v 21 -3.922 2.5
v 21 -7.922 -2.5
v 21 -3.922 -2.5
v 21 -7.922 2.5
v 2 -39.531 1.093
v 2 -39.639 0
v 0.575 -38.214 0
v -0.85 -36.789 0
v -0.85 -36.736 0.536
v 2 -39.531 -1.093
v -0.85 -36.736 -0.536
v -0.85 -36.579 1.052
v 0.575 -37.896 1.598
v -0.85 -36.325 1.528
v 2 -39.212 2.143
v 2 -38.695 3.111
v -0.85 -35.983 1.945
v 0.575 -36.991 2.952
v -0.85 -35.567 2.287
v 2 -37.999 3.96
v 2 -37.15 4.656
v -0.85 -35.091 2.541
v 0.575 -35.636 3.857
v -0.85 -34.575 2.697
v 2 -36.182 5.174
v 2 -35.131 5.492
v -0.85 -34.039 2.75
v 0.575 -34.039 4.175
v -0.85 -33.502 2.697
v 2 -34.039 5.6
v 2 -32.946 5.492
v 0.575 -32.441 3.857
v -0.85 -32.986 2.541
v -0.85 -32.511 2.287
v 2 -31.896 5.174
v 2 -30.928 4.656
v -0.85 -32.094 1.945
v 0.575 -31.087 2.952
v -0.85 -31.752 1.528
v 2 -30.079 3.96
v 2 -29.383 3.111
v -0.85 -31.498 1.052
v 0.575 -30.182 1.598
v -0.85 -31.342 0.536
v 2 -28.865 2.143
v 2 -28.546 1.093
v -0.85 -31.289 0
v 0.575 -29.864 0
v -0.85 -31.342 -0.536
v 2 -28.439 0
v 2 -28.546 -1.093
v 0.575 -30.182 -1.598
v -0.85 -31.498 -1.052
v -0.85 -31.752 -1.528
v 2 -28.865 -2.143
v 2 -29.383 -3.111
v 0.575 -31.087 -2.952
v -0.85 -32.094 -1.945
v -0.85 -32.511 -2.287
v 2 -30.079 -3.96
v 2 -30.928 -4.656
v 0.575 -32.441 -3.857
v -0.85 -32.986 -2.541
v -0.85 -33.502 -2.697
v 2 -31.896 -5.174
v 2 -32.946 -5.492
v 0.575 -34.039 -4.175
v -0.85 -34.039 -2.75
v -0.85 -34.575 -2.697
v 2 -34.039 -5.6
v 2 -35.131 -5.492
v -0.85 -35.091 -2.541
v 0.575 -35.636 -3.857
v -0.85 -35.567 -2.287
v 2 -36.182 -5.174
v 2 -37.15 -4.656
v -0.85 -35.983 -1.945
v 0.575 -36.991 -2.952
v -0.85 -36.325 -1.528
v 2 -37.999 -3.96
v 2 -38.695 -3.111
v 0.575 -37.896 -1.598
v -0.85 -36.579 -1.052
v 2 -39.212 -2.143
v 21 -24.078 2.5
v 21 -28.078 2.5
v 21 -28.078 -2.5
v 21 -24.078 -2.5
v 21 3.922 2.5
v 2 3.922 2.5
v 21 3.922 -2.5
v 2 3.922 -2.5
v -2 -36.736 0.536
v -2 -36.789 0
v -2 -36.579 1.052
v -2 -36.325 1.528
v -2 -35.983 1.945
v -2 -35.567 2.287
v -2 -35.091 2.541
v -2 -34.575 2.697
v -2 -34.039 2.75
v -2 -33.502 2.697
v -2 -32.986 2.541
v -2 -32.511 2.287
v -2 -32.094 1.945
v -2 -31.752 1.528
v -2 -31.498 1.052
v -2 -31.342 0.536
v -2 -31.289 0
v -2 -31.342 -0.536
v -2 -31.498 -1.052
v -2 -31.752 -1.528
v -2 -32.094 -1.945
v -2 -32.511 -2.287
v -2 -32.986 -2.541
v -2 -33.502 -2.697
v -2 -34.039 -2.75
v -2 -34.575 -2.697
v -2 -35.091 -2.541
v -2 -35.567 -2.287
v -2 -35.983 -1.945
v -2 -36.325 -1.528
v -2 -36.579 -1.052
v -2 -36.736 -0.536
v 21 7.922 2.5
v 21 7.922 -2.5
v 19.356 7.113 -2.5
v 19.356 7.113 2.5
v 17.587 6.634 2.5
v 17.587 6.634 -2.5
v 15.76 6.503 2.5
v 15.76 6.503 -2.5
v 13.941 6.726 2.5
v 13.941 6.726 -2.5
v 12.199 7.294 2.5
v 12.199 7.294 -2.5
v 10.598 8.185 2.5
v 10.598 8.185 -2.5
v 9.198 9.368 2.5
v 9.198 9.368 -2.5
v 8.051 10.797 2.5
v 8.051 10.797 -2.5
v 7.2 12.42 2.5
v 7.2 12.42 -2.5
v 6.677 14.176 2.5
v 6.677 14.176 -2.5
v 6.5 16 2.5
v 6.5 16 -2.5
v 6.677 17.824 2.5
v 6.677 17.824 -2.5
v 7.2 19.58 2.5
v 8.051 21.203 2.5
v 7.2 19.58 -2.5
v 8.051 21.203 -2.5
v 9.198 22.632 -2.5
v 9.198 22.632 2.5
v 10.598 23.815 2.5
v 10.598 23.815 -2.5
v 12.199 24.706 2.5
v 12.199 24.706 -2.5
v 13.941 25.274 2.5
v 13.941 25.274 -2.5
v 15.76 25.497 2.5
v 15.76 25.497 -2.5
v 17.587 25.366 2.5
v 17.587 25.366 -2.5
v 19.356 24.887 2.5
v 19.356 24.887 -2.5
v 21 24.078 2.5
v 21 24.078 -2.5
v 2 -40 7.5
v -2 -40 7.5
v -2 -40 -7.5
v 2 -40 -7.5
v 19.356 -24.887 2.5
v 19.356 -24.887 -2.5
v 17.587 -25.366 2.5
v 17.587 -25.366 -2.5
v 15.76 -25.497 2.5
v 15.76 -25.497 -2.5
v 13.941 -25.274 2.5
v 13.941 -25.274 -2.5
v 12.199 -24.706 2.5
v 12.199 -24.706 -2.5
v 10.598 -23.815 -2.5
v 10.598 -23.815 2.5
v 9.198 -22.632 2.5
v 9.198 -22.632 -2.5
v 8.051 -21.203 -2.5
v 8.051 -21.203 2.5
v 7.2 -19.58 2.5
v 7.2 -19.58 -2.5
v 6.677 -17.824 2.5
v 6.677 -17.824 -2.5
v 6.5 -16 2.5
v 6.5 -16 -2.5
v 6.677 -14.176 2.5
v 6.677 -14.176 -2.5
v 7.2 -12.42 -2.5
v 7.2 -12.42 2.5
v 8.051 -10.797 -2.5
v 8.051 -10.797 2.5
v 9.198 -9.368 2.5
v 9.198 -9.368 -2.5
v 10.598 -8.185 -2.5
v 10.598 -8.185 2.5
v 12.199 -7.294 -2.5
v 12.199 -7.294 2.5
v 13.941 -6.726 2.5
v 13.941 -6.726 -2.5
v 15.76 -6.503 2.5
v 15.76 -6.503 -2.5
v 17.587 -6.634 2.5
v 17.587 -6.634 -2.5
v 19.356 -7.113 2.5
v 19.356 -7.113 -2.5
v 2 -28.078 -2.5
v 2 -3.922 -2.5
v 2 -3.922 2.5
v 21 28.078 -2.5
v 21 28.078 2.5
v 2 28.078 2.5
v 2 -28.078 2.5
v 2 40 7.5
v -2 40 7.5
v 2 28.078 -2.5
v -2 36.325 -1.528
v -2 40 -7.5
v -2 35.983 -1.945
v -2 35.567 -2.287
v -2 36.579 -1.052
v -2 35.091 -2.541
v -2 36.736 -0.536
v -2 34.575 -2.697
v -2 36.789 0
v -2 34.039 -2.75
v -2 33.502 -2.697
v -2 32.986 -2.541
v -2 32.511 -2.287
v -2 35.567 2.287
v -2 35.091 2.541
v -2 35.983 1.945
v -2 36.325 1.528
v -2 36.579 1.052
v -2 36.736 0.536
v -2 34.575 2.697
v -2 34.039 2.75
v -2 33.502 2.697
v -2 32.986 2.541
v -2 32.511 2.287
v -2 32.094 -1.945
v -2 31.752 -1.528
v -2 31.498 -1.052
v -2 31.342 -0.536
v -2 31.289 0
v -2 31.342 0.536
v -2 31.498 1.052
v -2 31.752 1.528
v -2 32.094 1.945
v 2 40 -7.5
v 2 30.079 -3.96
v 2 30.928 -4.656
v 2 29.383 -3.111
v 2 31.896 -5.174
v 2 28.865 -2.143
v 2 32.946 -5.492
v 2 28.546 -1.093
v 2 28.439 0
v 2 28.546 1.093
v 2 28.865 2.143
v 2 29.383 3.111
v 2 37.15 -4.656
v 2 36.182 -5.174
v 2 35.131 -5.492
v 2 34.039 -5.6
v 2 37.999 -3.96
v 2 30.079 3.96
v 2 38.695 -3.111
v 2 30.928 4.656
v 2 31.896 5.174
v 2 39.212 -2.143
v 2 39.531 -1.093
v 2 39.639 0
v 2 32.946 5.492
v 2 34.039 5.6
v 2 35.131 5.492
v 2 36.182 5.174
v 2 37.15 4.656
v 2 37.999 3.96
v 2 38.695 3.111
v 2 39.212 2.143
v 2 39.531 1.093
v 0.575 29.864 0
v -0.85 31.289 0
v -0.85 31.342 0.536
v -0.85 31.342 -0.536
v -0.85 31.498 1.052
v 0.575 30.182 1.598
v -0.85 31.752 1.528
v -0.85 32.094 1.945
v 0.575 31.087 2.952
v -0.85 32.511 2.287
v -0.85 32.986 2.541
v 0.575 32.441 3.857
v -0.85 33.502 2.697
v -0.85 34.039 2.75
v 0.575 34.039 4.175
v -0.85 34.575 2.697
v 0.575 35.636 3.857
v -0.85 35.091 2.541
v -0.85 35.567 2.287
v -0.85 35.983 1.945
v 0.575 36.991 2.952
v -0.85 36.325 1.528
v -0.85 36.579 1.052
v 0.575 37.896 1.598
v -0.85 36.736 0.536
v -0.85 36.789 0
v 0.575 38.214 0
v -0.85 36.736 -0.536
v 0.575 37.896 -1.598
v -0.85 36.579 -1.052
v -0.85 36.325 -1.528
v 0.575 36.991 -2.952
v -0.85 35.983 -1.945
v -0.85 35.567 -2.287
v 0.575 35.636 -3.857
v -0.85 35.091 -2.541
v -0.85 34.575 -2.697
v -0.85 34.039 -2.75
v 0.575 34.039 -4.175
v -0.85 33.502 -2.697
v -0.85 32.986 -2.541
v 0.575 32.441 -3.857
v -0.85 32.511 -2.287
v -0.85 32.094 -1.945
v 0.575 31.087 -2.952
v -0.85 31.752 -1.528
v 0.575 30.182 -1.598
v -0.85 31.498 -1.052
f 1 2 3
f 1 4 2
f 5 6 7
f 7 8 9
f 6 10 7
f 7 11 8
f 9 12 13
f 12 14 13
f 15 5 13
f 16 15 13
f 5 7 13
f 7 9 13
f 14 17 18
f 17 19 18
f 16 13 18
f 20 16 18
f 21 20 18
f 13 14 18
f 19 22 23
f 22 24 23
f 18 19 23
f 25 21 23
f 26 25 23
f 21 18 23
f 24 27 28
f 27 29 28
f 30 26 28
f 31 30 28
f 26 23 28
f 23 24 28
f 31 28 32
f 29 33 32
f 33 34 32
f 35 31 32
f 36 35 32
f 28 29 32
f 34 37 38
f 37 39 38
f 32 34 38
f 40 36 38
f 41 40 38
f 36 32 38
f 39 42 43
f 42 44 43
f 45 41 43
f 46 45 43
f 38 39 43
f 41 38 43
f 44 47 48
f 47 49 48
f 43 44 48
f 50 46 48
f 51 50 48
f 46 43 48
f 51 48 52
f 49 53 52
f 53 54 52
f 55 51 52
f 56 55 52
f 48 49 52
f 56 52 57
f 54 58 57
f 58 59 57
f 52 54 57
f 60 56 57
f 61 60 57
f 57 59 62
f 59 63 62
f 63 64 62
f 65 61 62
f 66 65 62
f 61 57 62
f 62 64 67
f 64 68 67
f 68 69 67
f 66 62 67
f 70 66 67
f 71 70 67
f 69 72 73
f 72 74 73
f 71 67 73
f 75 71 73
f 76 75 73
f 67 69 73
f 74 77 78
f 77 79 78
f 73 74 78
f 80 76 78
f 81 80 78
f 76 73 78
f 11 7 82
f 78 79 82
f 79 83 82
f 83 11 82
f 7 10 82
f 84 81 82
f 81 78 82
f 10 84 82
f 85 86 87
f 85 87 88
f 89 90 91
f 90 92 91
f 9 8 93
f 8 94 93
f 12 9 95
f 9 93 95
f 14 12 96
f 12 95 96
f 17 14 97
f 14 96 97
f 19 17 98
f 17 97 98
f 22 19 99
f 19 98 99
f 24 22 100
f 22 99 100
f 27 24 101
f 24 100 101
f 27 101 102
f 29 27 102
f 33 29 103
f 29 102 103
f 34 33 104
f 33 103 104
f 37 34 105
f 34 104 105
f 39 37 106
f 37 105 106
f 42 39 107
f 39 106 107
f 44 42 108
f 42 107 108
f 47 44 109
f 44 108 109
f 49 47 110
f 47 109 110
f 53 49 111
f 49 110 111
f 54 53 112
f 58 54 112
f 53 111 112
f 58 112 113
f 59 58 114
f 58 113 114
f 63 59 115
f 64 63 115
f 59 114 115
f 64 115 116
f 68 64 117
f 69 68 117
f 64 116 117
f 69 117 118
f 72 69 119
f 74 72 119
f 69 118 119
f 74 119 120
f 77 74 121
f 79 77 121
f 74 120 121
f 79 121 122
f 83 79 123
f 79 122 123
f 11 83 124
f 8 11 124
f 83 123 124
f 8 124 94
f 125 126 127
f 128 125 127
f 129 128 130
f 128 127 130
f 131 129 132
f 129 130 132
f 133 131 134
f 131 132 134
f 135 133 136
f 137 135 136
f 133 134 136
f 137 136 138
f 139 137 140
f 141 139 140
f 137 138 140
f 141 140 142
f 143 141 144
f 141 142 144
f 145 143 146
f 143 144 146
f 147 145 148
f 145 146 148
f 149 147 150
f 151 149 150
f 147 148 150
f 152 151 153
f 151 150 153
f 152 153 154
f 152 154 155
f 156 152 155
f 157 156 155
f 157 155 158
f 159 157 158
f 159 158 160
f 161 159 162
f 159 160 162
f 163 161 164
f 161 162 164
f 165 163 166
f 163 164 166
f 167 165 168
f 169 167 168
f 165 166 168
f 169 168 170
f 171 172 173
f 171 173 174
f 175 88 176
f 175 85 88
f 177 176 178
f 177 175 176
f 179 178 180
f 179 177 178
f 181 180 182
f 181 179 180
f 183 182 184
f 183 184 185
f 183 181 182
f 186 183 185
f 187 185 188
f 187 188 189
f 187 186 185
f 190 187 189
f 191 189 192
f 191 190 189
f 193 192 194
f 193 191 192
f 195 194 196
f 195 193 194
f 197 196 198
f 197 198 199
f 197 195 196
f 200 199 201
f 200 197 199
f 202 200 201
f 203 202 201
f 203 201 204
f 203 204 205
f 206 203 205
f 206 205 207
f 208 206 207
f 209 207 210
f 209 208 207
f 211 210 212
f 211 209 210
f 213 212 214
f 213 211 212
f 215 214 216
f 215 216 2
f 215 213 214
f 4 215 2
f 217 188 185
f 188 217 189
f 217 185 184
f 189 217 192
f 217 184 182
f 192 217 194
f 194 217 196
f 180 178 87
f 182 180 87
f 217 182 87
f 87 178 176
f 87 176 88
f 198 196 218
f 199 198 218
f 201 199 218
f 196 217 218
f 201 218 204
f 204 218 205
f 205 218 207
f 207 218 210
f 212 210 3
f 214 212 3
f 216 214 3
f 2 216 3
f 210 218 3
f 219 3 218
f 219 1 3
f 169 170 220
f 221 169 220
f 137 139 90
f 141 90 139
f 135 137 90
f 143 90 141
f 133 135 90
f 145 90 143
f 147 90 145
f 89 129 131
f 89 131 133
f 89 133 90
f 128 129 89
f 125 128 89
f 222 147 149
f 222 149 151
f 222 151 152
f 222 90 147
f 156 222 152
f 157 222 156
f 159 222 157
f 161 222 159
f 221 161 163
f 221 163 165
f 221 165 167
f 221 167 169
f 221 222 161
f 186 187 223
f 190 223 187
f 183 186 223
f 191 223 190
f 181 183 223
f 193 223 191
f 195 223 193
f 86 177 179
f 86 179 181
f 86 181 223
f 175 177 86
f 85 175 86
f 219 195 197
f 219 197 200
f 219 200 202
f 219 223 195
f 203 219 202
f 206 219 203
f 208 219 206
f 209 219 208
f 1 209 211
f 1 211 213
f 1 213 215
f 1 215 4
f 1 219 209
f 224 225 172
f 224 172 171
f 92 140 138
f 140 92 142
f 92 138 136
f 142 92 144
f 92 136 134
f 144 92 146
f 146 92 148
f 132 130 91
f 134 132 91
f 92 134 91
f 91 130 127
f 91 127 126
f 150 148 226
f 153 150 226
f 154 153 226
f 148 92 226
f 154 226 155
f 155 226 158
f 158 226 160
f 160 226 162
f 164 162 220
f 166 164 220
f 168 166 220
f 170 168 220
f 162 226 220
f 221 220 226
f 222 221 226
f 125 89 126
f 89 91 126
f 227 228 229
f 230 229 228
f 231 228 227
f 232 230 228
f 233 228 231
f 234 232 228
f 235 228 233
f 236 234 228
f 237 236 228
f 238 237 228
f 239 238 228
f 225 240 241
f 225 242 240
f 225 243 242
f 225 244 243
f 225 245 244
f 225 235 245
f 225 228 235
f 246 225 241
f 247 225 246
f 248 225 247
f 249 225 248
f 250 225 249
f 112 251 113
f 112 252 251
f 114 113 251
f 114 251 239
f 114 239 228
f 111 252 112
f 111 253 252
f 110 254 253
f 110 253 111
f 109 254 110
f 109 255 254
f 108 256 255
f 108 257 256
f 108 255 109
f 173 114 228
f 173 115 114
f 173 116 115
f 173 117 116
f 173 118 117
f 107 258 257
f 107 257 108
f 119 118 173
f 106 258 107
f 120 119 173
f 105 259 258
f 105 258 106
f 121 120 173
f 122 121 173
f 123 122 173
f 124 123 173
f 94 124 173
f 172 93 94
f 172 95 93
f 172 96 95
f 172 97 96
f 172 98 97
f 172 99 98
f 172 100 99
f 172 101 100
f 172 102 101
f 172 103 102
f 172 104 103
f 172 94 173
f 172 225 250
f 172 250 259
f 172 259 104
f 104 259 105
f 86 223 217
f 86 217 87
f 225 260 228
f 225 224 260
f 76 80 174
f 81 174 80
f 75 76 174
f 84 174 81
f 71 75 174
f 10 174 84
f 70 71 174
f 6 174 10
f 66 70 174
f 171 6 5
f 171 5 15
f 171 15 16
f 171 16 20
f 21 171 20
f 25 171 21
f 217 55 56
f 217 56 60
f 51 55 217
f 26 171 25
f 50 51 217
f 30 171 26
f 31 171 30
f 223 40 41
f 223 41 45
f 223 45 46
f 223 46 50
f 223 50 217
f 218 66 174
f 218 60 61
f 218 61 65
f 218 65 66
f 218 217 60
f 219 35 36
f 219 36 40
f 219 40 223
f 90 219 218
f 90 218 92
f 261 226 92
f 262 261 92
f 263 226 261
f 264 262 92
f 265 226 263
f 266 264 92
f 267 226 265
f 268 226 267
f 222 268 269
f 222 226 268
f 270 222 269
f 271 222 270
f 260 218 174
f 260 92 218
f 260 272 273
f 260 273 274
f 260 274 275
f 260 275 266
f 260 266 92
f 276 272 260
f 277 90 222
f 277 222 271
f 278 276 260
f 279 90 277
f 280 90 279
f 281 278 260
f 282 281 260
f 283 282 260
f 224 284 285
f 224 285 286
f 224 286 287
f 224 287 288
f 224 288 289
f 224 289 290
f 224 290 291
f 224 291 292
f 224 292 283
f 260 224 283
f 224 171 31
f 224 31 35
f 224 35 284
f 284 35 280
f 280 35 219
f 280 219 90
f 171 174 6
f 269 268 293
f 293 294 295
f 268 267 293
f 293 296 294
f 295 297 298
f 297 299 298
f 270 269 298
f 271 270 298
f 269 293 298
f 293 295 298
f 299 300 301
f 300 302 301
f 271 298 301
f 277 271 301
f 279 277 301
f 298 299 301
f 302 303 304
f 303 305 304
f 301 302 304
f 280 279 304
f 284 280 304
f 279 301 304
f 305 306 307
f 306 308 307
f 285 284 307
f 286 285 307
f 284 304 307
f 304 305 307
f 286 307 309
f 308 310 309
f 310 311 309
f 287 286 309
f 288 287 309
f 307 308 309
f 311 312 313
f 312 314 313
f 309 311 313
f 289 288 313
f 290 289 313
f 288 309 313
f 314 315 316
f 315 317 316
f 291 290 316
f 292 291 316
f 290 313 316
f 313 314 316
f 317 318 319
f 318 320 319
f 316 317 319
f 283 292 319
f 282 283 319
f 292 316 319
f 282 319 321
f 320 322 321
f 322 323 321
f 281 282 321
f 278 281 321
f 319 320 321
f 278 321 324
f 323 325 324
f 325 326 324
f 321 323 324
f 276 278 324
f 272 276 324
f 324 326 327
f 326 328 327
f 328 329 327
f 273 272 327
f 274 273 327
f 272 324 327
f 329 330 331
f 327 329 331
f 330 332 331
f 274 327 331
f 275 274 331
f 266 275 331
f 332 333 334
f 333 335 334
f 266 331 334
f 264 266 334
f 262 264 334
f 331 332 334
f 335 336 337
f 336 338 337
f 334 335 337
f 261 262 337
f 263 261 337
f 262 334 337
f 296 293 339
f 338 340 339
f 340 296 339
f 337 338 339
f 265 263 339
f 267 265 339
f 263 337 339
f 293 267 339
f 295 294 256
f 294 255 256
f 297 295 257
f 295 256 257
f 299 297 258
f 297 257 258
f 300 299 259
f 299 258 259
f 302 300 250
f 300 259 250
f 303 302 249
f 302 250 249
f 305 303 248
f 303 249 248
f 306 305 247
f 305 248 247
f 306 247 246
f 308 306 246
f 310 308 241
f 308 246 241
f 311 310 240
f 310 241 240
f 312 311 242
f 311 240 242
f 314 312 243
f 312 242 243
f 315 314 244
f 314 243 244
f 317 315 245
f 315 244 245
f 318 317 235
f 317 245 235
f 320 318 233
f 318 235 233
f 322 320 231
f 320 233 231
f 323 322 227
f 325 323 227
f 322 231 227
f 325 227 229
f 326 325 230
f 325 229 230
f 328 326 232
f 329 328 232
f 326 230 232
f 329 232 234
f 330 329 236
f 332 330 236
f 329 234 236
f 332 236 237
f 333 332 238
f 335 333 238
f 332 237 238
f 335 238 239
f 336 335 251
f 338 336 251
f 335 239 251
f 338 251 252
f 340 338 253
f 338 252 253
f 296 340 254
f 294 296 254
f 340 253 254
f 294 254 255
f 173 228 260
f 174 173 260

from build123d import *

# Parameters (mm, degrees)
F1_DEPTH       = 7.5
F2_DEPTH       = 2.5
F4_D           = 5.5
F4_DEPTH       = 8
F4_CSINK_D     = 11.2
F4_CSINK_ANGLE = 90
F4_TIP         = 1.6523667023


with BuildPart() as f1:
    # F0 (on Top) → F1 (new body, symmetric)
    with BuildSketch(Plane.XY):
        Polygon((2, 28.0777472107), (2, 40), (-2, 40), (-2, -40), (2, -40), (2, -28.0777472107), (2, -3.9222527893), (2, 3.9222527893), align=None)
    extrude(amount=F1_DEPTH, both=True)

    # F0 (on Top) → F2 (join, symmetric)
    with BuildSketch(Plane.XY):
        with BuildLine():
            Line((21, 28.0777472107), (2, 28.0777472107))
            Line((2, 28.0777472107), (2, 3.9222527893))
            Line((2, 3.9222527893), (21, 3.9222527893))
            Line((21, 3.9222527893), (21, 7.9222527893))
            ThreePointArc((21, 7.9222527893), (6.5, 16), (21, 24.0777472107))
            Line((21, 24.0777472107), (21, 28.0777472107))
        make_face()
        with BuildLine():
            Line((21, -3.9222527893), (2, -3.9222527893))
            Line((2, -3.9222527893), (2, -28.0777472107))
            Line((2, -28.0777472107), (21, -28.0777472107))
            Line((21, -28.0777472107), (21, -24.0777472107))
            ThreePointArc((21, -24.0777472107), (6.5, -16), (21, -7.9222527893))
            Line((21, -7.9222527893), (21, -3.9222527893))
        make_face()
    extrude(amount=F2_DEPTH, both=True)

    # F4
    with Locations(Plane.YZ.offset(2)):
        with Locations((-34.0387472107, 0), (34.0387472107, 0)):
            CounterSinkHole(F4_D / 2, F4_CSINK_D / 2, depth=F4_DEPTH, counter_sink_angle=F4_CSINK_ANGLE)
            with Locations((0, 0, -(F4_DEPTH + F4_TIP / 2))):  # 118° drill point
                Cone(0, F4_D / 2, F4_TIP, mode=Mode.SUBTRACT)


solid = f1.part
